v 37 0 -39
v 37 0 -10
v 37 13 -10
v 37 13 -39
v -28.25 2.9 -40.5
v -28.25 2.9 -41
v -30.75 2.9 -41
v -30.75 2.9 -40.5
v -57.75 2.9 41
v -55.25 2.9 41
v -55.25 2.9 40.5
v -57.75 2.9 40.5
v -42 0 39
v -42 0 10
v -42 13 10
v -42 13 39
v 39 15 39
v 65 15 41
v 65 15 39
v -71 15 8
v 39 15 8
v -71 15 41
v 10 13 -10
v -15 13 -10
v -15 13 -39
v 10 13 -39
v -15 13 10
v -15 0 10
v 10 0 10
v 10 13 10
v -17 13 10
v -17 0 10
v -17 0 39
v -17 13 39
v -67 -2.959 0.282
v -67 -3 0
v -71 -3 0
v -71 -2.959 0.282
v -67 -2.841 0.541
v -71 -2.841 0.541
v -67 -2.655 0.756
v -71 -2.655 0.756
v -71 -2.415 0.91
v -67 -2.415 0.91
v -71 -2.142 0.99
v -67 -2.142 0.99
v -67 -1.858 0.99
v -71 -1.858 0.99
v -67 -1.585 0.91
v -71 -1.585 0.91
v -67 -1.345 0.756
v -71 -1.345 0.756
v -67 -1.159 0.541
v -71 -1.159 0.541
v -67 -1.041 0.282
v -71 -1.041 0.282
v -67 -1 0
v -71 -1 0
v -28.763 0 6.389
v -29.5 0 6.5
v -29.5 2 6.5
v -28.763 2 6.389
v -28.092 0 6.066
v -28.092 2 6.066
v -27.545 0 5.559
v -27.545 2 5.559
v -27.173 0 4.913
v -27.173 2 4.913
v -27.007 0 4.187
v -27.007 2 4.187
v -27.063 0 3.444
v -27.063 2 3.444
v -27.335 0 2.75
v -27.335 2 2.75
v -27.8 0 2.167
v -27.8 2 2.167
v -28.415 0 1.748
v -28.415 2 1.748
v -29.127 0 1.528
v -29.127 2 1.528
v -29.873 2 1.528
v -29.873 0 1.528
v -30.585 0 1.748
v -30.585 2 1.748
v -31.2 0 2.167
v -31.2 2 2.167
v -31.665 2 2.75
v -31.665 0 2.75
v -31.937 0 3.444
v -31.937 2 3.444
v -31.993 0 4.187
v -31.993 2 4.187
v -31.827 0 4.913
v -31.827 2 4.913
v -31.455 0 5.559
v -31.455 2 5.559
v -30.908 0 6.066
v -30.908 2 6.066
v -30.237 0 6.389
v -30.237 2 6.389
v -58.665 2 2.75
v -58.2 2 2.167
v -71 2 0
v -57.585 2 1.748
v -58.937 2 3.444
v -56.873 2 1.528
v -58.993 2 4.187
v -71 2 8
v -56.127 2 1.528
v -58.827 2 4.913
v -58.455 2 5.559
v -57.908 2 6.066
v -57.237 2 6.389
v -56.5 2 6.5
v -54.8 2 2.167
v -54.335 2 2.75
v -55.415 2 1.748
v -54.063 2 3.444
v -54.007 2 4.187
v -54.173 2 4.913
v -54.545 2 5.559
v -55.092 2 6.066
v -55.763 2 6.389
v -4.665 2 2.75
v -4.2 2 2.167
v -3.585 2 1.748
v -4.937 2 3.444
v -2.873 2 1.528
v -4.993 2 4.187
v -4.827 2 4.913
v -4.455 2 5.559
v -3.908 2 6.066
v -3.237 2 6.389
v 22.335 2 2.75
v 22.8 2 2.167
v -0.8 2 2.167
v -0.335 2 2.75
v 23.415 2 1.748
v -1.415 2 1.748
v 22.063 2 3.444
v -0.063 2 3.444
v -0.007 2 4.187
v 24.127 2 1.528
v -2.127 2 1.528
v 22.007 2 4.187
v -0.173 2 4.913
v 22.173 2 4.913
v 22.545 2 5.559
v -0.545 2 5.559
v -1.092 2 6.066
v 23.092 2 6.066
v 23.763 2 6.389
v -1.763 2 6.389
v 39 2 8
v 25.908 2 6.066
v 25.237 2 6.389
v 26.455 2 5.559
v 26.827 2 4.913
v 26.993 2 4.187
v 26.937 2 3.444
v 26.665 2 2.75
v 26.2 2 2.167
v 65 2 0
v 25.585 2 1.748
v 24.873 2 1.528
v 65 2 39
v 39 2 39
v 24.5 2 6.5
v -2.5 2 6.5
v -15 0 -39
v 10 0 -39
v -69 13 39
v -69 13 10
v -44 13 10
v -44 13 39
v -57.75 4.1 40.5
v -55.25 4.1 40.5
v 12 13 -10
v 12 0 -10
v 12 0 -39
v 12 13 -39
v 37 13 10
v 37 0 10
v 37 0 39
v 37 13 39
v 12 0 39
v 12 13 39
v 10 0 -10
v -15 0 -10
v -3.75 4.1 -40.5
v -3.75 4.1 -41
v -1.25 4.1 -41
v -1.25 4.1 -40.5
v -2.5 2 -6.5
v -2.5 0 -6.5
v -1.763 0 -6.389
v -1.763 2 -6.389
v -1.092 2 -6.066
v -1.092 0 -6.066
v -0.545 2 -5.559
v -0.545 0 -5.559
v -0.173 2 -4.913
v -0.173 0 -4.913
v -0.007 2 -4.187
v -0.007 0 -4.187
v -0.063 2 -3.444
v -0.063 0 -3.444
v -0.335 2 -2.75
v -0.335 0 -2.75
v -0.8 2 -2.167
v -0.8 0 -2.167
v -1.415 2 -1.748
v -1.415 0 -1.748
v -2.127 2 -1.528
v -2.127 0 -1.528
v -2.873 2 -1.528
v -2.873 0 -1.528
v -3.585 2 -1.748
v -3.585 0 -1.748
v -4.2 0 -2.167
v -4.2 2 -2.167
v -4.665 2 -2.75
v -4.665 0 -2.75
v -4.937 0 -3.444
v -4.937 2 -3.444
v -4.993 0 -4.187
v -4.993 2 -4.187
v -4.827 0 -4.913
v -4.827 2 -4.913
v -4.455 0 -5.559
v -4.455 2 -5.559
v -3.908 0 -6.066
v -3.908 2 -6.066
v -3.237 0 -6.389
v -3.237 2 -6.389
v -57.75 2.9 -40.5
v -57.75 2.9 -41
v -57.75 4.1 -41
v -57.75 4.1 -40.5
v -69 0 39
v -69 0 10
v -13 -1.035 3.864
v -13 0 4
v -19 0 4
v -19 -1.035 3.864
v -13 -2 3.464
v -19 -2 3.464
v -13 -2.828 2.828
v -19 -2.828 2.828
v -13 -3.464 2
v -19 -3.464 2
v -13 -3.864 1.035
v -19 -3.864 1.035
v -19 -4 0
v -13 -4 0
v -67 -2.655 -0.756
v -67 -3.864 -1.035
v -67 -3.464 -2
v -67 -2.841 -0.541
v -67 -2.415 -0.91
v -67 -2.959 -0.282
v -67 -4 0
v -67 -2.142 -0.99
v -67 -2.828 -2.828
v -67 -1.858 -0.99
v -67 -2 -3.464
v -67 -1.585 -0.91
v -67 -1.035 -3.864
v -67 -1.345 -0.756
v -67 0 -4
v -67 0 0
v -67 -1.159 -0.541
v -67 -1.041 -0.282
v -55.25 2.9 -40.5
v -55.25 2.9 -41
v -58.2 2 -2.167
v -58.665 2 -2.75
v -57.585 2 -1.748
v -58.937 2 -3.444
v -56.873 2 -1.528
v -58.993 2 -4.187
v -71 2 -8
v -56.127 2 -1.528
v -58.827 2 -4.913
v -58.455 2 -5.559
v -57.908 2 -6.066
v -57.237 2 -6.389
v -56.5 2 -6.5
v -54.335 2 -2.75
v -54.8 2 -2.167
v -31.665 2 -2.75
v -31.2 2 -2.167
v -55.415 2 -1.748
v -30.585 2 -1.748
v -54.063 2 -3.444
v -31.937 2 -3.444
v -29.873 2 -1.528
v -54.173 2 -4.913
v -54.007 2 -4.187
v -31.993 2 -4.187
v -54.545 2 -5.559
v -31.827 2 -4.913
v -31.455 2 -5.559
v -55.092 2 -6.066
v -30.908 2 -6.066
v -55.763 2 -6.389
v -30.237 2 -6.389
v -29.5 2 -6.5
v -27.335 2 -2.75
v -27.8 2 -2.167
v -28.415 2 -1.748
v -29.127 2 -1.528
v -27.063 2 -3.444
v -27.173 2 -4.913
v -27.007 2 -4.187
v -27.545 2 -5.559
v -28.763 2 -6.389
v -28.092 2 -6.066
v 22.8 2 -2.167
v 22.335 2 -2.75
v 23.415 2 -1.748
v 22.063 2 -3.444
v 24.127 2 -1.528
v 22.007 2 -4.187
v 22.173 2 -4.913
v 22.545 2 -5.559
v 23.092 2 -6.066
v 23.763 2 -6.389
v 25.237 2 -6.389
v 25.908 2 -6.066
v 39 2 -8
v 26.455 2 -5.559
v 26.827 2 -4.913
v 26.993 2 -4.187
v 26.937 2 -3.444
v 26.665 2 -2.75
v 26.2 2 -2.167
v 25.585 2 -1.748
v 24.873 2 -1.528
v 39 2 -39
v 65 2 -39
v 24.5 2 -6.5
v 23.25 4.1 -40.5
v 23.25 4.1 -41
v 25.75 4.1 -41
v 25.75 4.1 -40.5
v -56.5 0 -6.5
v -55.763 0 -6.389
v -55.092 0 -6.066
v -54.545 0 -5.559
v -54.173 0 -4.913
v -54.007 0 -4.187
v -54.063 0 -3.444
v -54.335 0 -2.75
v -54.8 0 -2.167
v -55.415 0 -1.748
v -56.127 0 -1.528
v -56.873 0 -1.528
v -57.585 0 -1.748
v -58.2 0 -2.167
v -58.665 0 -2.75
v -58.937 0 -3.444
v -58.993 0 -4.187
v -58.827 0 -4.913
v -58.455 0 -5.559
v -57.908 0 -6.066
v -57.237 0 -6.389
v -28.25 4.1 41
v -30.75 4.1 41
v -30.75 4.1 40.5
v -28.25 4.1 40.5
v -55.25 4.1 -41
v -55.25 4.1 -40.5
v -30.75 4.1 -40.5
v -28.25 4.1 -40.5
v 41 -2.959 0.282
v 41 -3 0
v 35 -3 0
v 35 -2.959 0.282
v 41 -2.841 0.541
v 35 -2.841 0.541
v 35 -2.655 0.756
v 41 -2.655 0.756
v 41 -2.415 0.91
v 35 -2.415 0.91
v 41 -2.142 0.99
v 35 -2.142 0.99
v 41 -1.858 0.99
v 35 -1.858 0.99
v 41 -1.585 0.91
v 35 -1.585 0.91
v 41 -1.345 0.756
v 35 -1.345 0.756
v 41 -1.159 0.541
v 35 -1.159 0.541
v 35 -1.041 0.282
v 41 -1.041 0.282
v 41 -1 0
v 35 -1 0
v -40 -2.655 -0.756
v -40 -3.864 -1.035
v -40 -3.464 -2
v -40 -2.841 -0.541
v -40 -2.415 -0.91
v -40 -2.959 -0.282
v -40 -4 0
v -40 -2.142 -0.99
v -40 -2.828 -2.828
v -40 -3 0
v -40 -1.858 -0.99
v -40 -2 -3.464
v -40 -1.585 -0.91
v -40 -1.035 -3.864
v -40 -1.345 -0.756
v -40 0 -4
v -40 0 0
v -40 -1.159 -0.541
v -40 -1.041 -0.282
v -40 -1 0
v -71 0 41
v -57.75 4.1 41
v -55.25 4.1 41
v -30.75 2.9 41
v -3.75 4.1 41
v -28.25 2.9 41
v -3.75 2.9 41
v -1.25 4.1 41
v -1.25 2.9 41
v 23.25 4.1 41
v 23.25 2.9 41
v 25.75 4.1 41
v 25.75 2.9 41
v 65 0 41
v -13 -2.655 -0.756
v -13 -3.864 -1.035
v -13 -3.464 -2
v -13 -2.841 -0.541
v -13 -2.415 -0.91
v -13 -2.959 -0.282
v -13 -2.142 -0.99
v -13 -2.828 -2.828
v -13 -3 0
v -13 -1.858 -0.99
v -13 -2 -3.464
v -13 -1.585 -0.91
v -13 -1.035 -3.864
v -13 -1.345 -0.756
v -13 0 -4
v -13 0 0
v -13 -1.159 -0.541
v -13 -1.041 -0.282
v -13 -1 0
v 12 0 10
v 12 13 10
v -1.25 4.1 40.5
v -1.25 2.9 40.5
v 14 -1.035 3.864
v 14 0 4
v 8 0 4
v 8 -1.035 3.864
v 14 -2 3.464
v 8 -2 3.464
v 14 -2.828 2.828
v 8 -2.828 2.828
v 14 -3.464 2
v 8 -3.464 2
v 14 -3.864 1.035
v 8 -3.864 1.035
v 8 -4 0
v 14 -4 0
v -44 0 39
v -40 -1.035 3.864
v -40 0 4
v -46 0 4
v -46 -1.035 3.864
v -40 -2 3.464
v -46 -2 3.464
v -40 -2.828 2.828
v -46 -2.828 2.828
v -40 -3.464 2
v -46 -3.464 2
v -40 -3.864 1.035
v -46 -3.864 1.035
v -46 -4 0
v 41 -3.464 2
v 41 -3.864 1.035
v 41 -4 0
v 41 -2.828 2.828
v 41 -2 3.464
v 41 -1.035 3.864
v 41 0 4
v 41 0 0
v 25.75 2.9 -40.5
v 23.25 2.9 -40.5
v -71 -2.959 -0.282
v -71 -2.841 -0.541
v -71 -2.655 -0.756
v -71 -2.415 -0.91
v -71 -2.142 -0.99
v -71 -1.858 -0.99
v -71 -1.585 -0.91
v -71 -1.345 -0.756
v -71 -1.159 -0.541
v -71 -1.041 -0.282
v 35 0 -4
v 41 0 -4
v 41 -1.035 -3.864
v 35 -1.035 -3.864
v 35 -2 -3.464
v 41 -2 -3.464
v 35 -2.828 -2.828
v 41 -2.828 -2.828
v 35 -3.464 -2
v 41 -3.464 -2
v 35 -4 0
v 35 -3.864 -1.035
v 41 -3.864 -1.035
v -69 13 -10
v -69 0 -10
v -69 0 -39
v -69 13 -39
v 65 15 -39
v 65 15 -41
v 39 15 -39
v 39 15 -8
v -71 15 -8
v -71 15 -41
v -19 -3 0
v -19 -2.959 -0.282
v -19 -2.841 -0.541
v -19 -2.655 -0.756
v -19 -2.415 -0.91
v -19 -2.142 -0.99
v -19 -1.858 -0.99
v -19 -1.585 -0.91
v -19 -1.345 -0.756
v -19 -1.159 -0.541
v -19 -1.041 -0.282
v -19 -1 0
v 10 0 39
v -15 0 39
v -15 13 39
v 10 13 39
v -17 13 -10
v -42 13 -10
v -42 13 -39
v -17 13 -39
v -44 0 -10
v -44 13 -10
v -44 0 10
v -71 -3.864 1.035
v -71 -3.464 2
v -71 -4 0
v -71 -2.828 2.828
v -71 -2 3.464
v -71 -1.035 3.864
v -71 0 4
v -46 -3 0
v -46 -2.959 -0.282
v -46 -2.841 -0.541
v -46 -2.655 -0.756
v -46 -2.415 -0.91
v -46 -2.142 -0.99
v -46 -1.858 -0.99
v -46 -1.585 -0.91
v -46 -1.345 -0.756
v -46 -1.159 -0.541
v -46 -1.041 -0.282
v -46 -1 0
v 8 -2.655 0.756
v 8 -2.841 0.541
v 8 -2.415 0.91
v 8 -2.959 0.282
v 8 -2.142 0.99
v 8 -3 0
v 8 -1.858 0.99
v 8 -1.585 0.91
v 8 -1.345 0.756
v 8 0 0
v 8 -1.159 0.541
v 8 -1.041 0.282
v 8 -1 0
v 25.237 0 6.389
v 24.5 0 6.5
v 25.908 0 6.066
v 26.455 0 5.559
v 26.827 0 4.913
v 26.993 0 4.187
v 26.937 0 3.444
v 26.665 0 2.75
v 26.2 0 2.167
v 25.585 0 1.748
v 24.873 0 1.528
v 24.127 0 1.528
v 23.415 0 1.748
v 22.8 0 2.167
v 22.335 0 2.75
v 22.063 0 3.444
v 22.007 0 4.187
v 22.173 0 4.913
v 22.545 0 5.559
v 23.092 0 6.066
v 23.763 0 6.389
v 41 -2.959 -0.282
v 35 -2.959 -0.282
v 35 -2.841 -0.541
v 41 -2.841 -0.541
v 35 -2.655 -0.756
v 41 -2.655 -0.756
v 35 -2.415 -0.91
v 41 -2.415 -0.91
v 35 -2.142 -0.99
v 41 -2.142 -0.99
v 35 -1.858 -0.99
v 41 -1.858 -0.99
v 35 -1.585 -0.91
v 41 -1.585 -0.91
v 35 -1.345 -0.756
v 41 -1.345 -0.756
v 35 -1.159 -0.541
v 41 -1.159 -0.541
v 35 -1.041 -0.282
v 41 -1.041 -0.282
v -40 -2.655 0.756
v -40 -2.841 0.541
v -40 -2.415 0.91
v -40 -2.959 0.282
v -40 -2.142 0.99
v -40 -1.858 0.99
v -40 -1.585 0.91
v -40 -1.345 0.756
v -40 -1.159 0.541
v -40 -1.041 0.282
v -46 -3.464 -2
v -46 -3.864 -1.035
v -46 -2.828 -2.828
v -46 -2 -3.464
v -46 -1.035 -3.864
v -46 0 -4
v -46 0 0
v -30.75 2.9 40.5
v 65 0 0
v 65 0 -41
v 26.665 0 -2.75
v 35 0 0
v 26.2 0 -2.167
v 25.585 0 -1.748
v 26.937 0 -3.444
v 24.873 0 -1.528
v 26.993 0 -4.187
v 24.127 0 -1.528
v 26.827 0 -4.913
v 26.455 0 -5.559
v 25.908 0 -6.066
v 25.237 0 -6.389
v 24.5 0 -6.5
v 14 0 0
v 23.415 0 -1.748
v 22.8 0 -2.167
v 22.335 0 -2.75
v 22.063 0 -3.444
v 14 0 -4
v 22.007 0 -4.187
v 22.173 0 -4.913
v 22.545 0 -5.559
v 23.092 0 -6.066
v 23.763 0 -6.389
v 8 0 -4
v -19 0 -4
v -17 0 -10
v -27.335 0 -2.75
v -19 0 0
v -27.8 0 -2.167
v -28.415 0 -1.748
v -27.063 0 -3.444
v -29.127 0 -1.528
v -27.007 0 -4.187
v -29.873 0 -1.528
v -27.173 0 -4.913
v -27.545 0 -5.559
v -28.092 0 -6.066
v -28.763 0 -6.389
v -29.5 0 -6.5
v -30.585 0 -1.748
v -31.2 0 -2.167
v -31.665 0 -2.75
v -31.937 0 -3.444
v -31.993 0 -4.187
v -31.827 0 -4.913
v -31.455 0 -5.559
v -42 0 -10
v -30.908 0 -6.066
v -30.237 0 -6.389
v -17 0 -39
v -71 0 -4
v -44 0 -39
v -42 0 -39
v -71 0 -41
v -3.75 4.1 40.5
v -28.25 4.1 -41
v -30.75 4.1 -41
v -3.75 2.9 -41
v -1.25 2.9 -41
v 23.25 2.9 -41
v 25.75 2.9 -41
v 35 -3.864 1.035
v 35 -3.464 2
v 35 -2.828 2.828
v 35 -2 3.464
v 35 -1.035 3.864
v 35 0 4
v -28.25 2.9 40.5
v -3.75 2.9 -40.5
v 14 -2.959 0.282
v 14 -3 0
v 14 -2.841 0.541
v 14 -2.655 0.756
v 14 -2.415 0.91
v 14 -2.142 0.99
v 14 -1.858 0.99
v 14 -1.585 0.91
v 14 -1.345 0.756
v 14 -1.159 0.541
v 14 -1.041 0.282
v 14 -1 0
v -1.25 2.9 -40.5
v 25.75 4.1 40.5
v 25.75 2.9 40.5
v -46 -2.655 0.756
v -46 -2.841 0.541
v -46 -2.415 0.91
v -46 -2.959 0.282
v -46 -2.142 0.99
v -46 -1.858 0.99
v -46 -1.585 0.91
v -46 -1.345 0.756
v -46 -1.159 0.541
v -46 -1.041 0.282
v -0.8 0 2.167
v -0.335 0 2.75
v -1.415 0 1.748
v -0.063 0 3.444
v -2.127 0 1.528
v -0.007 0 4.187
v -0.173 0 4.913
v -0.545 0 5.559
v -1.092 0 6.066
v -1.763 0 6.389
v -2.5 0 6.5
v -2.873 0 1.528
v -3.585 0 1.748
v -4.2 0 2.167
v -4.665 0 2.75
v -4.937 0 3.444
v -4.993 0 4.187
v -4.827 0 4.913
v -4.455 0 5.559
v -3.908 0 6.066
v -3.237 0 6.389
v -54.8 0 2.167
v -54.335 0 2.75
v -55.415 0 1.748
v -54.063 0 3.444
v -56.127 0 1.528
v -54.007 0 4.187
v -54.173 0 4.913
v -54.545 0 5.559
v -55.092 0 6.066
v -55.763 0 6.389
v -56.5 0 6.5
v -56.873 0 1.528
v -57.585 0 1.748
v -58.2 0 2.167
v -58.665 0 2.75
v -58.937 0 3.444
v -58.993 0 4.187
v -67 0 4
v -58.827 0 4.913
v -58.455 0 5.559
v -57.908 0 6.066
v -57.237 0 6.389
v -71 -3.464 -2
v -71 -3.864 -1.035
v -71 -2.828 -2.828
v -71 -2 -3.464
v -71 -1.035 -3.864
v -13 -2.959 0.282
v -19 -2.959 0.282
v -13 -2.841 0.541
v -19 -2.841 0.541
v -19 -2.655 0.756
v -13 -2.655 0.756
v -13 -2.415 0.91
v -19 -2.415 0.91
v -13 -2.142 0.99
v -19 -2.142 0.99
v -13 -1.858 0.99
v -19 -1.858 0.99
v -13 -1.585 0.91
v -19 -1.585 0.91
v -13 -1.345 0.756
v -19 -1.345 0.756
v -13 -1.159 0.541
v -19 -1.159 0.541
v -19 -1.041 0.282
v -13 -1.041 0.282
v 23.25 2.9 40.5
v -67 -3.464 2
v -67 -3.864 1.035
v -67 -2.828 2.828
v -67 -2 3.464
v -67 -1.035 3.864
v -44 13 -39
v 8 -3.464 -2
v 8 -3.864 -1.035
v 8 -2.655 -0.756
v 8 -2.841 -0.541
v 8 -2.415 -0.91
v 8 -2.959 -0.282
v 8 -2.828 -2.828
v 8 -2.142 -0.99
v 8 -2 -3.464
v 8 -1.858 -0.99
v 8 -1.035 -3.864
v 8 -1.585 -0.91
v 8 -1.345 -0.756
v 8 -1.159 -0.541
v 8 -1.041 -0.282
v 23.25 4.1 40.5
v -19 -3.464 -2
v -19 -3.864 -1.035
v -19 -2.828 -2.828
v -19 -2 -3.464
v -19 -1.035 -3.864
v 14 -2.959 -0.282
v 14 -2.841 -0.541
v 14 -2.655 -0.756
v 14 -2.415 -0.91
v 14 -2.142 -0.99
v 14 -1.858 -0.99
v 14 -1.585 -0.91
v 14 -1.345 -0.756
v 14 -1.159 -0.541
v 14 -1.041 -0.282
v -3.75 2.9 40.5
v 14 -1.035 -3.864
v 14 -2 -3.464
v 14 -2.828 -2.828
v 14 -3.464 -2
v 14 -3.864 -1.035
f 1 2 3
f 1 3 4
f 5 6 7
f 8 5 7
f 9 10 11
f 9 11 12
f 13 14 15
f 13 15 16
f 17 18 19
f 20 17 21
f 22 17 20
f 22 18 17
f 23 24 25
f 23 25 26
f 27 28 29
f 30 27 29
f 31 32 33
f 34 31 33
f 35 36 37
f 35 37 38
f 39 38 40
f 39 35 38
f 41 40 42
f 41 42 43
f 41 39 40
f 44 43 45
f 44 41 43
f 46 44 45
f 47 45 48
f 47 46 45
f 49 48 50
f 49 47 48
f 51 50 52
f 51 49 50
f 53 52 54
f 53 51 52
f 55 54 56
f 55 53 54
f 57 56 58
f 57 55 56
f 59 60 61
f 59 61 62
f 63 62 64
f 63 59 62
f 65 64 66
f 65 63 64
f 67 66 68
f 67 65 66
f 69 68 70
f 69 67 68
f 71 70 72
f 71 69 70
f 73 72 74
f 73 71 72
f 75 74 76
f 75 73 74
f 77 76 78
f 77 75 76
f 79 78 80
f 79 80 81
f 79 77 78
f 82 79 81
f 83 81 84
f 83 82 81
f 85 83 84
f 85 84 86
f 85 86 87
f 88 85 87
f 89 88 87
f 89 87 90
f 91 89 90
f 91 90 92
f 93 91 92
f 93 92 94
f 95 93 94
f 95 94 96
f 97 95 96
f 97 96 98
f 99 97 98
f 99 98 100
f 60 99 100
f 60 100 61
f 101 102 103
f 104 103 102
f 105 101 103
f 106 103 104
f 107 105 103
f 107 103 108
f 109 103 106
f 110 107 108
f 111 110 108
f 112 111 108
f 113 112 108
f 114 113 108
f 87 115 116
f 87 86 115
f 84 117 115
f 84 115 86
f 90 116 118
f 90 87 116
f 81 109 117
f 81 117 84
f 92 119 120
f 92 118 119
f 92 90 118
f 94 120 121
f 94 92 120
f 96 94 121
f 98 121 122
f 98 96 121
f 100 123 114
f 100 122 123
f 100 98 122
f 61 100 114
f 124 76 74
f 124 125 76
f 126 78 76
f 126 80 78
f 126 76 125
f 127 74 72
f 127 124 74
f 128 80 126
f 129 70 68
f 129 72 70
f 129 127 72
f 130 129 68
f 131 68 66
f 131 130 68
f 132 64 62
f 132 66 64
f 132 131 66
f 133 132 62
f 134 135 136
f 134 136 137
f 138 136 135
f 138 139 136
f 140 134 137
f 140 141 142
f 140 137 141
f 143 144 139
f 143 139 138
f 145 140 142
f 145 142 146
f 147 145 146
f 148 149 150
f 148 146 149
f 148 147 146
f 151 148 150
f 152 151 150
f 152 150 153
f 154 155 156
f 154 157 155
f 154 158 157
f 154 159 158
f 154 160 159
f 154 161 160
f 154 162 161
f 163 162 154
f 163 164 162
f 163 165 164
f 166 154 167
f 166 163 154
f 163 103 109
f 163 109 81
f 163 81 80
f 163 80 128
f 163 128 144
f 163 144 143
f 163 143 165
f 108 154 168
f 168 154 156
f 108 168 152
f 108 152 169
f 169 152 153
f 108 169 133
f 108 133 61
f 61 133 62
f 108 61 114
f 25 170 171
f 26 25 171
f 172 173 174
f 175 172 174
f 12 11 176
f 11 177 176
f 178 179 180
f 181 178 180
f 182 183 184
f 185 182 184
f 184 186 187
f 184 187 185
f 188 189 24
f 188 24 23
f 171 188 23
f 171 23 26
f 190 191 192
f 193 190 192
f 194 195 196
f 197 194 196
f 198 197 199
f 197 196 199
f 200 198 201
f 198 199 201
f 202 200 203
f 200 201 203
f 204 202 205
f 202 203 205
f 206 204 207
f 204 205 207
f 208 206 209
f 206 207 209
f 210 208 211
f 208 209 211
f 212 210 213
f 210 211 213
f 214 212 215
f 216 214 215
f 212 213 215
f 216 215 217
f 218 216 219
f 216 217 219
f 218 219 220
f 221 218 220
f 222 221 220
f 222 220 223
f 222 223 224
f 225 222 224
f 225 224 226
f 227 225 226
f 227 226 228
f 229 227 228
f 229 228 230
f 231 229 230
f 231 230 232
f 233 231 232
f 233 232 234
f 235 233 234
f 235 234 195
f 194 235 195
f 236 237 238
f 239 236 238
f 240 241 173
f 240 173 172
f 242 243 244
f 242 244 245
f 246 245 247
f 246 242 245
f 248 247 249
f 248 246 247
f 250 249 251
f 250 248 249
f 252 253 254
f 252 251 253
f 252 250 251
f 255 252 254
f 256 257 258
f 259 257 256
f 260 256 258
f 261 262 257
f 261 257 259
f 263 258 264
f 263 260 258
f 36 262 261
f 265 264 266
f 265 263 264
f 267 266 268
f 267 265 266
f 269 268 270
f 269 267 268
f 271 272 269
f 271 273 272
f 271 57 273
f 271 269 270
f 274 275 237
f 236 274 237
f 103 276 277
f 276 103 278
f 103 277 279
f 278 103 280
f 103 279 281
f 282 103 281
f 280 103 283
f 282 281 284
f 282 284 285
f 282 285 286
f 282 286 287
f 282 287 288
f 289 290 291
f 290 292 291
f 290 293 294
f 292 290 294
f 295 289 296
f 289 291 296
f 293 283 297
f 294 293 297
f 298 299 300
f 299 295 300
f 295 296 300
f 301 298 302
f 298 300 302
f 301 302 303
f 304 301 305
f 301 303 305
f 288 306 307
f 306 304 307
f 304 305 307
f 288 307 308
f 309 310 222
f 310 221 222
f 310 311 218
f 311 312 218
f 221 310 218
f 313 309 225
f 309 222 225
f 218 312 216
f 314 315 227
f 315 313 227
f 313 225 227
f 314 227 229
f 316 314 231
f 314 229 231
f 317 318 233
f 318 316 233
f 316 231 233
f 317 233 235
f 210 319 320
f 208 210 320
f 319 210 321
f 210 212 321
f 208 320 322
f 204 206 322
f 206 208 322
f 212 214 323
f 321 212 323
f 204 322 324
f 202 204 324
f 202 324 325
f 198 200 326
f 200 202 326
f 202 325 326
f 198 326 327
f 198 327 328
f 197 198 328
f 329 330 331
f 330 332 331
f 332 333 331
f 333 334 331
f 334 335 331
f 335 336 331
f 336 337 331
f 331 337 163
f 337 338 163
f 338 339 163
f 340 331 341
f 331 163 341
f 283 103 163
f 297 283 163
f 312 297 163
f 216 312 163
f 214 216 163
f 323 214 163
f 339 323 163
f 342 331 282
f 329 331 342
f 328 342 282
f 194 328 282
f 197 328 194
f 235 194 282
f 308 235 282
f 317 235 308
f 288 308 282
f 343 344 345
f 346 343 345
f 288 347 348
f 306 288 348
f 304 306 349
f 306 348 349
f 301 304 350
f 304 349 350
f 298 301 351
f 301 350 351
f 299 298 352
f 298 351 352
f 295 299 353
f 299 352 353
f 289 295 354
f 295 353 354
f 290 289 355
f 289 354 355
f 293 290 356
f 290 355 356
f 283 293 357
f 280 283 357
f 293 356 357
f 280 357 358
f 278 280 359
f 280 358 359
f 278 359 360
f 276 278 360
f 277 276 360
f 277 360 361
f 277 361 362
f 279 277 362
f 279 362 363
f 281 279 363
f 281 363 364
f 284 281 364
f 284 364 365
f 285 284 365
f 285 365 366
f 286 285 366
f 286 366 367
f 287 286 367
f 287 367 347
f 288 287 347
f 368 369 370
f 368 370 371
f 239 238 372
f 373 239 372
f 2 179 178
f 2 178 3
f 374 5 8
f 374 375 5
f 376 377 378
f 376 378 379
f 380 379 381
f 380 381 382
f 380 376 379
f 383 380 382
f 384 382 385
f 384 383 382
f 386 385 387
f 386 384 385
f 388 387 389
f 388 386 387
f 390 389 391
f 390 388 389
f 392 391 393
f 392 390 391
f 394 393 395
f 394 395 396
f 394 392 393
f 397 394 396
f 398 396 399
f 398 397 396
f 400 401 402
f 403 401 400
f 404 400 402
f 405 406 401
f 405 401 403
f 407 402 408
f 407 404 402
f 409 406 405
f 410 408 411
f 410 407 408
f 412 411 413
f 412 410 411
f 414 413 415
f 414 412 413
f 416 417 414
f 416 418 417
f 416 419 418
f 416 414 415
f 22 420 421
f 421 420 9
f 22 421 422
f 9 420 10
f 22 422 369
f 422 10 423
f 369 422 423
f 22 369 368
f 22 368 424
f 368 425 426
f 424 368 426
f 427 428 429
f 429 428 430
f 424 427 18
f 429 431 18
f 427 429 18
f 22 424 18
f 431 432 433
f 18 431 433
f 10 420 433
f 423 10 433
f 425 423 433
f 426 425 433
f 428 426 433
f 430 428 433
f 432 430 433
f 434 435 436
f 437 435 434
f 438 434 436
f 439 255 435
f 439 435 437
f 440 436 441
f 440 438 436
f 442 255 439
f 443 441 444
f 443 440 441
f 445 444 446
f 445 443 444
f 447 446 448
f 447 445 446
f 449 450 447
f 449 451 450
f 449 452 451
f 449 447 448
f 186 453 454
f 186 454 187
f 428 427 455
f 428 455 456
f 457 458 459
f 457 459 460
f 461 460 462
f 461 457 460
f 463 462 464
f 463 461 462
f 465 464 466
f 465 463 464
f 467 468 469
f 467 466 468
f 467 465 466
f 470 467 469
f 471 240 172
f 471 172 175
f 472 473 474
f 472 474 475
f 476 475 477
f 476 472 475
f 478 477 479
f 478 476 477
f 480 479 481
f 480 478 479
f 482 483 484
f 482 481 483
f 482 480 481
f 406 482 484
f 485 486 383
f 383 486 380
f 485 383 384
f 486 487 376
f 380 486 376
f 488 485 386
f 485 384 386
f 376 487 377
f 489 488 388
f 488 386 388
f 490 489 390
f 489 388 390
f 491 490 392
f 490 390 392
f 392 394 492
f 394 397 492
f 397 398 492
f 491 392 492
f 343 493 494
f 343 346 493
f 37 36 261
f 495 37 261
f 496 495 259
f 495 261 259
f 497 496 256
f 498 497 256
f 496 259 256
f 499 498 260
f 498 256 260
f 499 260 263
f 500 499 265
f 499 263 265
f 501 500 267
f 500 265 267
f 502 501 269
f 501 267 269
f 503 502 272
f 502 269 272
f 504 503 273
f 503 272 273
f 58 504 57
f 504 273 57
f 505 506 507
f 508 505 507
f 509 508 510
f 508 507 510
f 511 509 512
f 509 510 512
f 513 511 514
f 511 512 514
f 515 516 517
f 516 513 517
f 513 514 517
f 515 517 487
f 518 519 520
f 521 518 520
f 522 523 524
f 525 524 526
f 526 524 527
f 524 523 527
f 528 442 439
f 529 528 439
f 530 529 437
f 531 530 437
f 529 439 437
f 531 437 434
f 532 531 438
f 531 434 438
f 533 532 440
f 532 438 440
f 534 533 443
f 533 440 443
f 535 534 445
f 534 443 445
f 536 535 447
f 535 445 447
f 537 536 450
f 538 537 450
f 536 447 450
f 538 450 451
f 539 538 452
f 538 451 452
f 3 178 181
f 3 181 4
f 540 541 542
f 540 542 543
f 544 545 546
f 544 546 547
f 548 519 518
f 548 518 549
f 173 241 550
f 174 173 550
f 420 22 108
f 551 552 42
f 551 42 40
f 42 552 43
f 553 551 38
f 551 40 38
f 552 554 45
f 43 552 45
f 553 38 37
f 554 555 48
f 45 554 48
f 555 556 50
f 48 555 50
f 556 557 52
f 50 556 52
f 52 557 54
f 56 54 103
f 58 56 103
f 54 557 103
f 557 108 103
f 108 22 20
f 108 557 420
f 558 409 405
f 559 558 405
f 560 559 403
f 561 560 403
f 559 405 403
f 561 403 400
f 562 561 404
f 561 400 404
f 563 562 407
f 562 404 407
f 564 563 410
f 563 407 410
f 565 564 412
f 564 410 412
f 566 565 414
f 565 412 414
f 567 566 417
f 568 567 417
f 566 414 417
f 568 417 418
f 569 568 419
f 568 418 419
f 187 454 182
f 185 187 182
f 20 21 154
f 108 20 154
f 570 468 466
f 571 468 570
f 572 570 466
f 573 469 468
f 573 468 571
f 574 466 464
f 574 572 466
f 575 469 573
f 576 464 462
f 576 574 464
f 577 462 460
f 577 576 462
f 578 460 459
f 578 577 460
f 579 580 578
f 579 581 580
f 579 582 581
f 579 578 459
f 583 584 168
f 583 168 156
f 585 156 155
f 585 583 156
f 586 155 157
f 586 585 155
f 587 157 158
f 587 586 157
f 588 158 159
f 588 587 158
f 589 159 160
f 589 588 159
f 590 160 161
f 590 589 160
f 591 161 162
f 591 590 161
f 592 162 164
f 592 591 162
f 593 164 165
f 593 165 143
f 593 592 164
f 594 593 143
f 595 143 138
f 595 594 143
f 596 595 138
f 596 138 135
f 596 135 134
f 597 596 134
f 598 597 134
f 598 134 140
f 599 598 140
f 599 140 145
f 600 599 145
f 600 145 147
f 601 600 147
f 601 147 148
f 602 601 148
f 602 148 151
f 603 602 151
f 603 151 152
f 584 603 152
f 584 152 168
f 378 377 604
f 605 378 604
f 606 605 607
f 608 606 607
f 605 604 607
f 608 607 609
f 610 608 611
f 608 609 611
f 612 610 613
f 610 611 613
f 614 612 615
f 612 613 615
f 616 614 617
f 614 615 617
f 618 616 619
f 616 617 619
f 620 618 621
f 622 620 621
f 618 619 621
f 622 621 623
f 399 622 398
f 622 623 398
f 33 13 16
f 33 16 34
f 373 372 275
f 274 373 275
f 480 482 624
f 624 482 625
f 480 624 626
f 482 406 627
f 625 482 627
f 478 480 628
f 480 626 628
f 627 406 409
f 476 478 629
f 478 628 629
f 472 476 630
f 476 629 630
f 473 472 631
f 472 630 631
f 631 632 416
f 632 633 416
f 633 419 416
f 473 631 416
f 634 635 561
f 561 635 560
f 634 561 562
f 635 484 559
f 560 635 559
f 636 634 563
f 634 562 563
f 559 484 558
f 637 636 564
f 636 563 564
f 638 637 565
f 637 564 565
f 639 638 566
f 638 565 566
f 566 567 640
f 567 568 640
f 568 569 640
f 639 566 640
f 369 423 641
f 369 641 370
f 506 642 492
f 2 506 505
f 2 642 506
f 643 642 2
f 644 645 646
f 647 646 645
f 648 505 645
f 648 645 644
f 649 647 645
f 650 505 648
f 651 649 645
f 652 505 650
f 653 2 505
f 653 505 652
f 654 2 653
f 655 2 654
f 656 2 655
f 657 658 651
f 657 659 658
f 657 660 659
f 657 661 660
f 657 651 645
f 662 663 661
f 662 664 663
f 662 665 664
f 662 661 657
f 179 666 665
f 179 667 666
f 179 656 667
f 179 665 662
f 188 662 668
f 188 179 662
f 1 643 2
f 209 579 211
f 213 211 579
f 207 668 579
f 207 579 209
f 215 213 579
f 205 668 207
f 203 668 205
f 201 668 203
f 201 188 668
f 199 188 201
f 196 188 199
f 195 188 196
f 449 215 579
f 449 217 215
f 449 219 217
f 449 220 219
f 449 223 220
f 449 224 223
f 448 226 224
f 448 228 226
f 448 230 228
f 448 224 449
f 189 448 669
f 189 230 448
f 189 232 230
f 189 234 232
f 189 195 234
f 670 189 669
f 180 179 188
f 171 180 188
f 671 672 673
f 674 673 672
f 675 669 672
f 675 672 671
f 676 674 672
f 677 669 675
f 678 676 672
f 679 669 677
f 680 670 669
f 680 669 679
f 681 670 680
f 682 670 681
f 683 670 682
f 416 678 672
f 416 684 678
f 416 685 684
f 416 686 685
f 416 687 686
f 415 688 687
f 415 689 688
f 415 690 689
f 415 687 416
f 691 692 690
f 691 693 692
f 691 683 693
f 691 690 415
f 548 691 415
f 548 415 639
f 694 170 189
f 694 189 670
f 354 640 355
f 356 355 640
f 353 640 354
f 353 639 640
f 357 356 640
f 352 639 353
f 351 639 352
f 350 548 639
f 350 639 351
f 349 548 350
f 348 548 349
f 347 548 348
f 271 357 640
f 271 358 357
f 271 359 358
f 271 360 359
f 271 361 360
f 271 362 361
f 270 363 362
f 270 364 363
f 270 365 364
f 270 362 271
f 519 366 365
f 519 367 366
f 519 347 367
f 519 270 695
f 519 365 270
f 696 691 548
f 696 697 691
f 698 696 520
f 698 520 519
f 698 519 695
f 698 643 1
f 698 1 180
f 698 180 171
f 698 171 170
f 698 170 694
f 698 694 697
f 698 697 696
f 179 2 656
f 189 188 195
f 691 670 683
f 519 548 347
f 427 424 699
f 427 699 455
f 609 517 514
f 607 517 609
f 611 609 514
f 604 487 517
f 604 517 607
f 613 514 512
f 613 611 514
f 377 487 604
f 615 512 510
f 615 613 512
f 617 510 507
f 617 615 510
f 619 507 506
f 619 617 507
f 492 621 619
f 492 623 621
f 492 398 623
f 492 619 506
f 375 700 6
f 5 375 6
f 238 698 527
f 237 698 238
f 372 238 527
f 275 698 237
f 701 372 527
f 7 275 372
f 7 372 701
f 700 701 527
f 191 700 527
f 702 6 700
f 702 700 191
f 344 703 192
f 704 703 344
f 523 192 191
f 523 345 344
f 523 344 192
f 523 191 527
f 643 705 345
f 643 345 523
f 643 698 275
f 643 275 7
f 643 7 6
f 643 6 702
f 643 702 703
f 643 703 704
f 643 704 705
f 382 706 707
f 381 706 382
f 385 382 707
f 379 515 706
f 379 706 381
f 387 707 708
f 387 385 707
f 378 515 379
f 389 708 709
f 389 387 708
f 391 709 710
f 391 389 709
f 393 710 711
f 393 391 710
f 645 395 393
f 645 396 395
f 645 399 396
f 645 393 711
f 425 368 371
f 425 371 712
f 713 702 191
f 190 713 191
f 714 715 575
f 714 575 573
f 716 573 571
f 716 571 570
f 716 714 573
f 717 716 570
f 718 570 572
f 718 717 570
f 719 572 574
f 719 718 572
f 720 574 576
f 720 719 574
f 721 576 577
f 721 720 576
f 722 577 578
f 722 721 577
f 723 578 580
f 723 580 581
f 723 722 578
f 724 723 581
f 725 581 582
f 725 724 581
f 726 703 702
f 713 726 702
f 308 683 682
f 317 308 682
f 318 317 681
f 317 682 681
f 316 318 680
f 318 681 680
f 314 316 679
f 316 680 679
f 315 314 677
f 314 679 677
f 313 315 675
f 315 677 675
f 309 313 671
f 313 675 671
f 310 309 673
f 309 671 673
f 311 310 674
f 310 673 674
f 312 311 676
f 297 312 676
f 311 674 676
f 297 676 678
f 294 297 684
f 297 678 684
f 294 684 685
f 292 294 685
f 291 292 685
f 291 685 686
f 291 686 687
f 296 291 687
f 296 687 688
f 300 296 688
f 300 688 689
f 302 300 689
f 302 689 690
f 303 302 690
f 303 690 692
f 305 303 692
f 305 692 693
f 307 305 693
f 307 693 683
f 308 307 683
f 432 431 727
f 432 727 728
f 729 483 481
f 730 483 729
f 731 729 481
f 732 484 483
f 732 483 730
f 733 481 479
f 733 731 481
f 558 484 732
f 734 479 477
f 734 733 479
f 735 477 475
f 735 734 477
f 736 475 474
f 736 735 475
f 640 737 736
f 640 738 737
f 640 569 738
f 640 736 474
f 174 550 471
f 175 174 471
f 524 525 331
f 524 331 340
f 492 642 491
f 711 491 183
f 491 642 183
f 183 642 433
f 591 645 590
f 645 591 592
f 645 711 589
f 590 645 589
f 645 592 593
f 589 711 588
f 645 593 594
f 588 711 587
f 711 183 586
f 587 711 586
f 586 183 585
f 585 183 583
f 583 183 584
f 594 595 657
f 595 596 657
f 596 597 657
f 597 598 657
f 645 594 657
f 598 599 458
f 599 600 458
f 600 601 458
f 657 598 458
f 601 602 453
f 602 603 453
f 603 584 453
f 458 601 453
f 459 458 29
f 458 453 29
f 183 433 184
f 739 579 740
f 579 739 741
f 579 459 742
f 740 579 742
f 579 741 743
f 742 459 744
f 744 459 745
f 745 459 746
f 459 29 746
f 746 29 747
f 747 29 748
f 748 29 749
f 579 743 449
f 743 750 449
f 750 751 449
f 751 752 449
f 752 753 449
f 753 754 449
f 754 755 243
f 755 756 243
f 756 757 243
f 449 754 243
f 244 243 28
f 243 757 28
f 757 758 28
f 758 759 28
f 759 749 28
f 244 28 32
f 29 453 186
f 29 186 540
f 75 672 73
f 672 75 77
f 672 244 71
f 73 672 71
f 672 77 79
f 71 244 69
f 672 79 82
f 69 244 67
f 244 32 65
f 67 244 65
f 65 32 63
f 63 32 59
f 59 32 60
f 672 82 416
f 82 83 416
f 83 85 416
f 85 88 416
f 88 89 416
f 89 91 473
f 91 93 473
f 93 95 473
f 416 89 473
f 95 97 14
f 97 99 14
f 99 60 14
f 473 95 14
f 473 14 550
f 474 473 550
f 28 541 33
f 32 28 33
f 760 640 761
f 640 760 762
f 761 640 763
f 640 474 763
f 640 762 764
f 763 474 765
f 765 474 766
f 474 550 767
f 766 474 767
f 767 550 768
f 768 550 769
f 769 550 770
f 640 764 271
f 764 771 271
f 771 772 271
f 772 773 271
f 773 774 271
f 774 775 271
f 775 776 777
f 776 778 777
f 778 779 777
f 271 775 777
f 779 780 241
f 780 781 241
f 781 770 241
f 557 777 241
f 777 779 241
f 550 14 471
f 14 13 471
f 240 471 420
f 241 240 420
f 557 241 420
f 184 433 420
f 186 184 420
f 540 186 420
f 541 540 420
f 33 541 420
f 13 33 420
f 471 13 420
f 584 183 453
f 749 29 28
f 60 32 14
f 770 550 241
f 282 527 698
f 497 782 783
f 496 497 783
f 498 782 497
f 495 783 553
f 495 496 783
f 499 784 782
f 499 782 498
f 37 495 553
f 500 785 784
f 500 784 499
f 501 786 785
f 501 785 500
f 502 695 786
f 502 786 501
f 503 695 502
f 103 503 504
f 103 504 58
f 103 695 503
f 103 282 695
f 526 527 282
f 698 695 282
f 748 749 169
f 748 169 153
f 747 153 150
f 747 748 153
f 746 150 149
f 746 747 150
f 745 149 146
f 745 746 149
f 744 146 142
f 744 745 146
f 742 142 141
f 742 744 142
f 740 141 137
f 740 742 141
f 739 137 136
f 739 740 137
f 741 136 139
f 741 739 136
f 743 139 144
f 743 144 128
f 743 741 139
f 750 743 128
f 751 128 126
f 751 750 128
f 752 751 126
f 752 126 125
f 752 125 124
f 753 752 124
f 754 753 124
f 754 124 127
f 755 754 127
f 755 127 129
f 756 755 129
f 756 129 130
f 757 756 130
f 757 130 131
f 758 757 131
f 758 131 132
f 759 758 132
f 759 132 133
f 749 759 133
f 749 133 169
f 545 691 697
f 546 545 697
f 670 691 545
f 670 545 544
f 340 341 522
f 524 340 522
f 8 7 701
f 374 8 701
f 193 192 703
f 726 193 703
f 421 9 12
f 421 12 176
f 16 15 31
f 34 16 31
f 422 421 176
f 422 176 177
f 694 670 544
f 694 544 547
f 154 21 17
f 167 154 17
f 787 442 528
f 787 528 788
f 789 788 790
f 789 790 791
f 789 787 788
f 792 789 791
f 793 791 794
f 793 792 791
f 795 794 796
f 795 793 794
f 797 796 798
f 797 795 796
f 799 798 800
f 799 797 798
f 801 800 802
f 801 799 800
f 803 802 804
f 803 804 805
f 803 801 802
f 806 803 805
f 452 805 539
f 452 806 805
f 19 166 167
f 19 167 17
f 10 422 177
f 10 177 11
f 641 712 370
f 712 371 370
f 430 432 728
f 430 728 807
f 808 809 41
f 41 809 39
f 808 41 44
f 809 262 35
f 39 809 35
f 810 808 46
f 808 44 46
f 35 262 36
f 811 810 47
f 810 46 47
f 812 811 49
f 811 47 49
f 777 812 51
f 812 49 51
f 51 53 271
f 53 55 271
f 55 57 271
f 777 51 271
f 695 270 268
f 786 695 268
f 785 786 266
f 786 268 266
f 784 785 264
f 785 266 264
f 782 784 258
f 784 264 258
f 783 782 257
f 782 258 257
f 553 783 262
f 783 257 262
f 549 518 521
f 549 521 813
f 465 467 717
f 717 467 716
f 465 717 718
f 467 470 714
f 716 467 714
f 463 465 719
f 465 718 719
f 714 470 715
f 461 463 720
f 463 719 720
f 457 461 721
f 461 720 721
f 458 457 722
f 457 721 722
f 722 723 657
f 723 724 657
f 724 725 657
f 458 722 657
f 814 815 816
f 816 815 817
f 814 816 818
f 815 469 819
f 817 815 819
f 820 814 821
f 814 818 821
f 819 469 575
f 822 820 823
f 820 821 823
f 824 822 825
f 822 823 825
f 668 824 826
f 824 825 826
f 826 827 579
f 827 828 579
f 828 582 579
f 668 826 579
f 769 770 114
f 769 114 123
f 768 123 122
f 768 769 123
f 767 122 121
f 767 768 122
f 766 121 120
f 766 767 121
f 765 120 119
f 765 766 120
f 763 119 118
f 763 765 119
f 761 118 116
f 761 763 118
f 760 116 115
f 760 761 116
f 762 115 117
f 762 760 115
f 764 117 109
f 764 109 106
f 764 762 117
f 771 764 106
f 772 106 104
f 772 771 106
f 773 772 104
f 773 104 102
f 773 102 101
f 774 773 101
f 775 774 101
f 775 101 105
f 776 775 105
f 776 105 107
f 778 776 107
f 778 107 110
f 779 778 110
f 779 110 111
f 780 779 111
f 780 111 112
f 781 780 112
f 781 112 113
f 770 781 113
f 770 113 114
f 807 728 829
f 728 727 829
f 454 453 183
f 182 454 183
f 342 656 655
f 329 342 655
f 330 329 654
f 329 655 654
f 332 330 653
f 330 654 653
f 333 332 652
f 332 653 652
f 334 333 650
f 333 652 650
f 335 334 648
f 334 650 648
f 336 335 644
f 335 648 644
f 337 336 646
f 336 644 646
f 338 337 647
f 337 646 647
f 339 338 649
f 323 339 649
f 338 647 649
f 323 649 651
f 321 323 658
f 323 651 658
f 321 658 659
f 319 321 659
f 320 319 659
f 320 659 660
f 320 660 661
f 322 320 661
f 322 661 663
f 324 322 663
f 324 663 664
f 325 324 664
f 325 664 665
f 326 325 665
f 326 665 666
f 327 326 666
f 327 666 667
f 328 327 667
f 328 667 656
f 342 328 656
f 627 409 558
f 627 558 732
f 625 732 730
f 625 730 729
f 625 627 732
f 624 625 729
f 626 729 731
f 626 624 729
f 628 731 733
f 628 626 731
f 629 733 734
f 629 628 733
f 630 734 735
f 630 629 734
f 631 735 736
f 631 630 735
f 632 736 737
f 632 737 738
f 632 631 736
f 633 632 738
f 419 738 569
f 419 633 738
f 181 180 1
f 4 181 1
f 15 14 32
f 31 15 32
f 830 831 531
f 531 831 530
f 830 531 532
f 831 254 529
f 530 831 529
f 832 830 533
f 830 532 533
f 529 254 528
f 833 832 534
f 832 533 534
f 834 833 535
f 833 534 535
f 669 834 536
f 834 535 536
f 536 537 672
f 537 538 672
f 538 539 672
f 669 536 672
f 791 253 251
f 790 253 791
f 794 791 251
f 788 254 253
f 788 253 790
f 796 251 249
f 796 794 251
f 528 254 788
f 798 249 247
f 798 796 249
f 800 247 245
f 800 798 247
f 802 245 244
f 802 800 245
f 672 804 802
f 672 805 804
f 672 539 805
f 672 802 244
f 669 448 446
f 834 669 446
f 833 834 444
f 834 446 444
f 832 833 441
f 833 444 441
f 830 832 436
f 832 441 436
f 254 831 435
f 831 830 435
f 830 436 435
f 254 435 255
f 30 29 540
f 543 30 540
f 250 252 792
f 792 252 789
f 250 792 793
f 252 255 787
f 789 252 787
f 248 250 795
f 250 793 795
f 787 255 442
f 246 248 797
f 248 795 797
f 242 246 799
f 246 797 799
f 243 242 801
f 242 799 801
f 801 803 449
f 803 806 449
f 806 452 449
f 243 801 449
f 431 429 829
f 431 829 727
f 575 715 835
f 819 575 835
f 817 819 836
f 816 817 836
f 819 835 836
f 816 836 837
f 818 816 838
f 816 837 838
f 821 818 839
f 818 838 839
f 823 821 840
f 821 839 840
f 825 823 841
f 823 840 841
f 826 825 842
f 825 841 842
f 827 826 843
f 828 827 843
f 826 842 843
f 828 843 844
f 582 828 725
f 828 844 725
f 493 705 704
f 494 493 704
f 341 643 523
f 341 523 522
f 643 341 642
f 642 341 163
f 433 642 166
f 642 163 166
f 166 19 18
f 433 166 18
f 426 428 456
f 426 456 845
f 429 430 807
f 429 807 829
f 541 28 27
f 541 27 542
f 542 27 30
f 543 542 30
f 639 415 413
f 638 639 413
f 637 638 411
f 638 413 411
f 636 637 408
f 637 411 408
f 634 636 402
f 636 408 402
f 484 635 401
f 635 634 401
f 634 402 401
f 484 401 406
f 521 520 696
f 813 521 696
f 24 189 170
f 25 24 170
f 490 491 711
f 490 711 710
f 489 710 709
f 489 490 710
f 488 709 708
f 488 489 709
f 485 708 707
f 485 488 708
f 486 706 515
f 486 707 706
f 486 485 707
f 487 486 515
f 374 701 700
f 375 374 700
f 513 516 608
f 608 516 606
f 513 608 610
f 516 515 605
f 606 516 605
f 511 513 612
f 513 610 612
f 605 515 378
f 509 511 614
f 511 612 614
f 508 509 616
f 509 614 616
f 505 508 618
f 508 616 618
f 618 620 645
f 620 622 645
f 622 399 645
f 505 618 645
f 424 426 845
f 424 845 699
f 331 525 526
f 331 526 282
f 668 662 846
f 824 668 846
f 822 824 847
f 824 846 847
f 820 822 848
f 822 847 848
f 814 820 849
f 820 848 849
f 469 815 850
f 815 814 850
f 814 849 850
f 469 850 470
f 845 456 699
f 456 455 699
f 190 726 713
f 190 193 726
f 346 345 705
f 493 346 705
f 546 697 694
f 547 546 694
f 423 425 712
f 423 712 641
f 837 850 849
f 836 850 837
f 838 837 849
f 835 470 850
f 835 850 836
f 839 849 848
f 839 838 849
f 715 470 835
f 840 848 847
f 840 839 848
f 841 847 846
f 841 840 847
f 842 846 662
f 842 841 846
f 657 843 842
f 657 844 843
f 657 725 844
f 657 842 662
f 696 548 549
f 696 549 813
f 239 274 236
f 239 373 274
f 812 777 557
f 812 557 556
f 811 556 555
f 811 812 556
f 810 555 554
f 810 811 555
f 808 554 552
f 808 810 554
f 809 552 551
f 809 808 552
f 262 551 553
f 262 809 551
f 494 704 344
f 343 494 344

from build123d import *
from build123d.topology import SkipClean

# Parameters (mm, degrees)
EXTRUDE_1_DEPTH        = 15
SKETCH_4_W             = 25
SKETCH_4_H             = 29
CUT_EXTRUDE_2_DEPTH    = 13
PATTERN_LINEAR_1_COUNT = 4
PATTERN_LINEAR_1_PITCH = 27
CUT_EXTRUDE_3_DEPTH    = 149.559752288
EXTRUDE_2_DEPTH        = 142
CUT_EXTRUDE_4_DEPTH    = 149.559752288
SKETCH_14_W            = 21
SKETCH_14_H            = 4
CUT_EXTRUDE_7_DEPTH    = 84.348665256
PATTERN_LINEAR_3_COUNT = 5
PATTERN_LINEAR_3_PITCH = 27
CUT_EXTRUDE_8_DEPTH    = 84.348665256
SKETCH_17_R            = 2.5
CUT_EXTRUDE_9_DEPTH    = 84.348665256
PATTERN_LINEAR_4_COUNT = 4
PATTERN_LINEAR_4_PITCH = 27
SKETCH_21_W            = 31
SKETCH_21_H            = 13
CUT_EXTRUDE_11_DEPTH   = 32
CUT_EXTRUDE_12_DEPTH   = 0.5
PATTERN_LINEAR_5_COUNT = 4
PATTERN_LINEAR_5_PITCH = 27
CUT_EXTRUDE_13_DEPTH   = 6


# Read off the part's stored shape, not the designer's step: 镜向1
with BuildPart() as part:
    # 草图3 → 凸台-拉伸1 (new body)
    with BuildSketch(Plane(origin=(0, 0, 0), x_dir=(1, 0, 0), z_dir=(0, 1, 0))):
        Polygon((0, 0), (-71, 0), (-71, 41), (71, 41), (71, 0), align=None)
    extrude(amount=EXTRUDE_1_DEPTH)

    # 草图4 → 切除-拉伸2 (cut)
    with BuildSketch(Plane(origin=(0, 0, 0), x_dir=(1, 0, 0), z_dir=(0, 1, 0))):
        with Locations((-56.5, 24.5)):
            Rectangle(SKETCH_4_W, SKETCH_4_H)
    cut_extrude_2 = extrude(amount=CUT_EXTRUDE_2_DEPTH, mode=Mode.SUBTRACT)

    # 阵列(线性)1: 切除-拉伸2 ×4
    with Locations(*[(i * PATTERN_LINEAR_1_PITCH, 0, 0) for i in range(1, PATTERN_LINEAR_1_COUNT)]):
        add(cut_extrude_2, mode=Mode.SUBTRACT)

    # 草图6 → 切除-拉伸3 (cut, through all)
    with BuildSketch(Plane(origin=(71, 0, 0), x_dir=(0, 0, -1), z_dir=(1, 0, 0))):
        Polygon((0, 15), (7.5, 15), (8, 15), (8, 2), (7.5, 2), (0, 2), align=None)
    extrude(amount=-CUT_EXTRUDE_3_DEPTH, mode=Mode.SUBTRACT)

    # 草图7 → 凸台-拉伸2 (add)
    with BuildSketch(Plane(origin=(71, 0, 0), x_dir=(0, 0, -1), z_dir=(1, 0, 0))):
        with BuildLine():
            Line((0, 0), (4, 0))
            ThreePointArc((4, 0), (2.828427125, -2.828427125), (0, -4))
            Line((0, -4), (0, 0))
        make_face()
    extrude(amount=-EXTRUDE_2_DEPTH)

    # 草图8 → 切除-拉伸4 (cut, through all)
    with BuildSketch(Plane(origin=(71, 0, 0), x_dir=(0, 0, -1), z_dir=(1, 0, 0))):
        with BuildLine():
            Line((0, -1), (0, -2))
            Line((0, -2), (0, -3))
            ThreePointArc((0, -3), (1, -2), (0, -1))
        make_face()
    extrude(amount=-CUT_EXTRUDE_4_DEPTH, mode=Mode.SUBTRACT)

    # 草图14 → 切除-拉伸7 (cut, through all)
    with BuildSketch(Plane.XY):
        with Locations((-56.5, -2)):
            Rectangle(SKETCH_14_W, SKETCH_14_H)
    cut_extrude_7 = extrude(amount=-CUT_EXTRUDE_7_DEPTH, mode=Mode.SUBTRACT)

    # 阵列(线性)3: 切除-拉伸7 ×5
    with Locations(*[(i * PATTERN_LINEAR_3_PITCH, 0, 0) for i in range(1, PATTERN_LINEAR_3_COUNT)]):
        add(cut_extrude_7, mode=Mode.SUBTRACT)

    # 草图16 → 切除-拉伸8 (cut, through all)
    with BuildSketch(Plane.XY):
        Polygon((71, -1), (71, 0), (42.178247133, 0), (42.178247133, -4), (71, -4), align=None)
    extrude(amount=-CUT_EXTRUDE_8_DEPTH, mode=Mode.SUBTRACT)

    # 草图17 → 切除-拉伸9 (cut, through all)
    with BuildSketch(Plane.XZ):
        with Locations(Location((-56.5, -4, 0), (0, 0, 270))):
            Circle(SKETCH_17_R)
    cut_extrude_9 = extrude(amount=-CUT_EXTRUDE_9_DEPTH, mode=Mode.SUBTRACT)

    # 阵列(线性)4: 切除-拉伸9 ×4
    with Locations(*[(i * PATTERN_LINEAR_4_PITCH, 0, 0) for i in range(1, PATTERN_LINEAR_4_COUNT)]):
        add(cut_extrude_9, mode=Mode.SUBTRACT)

    # 草图21 → 切除-拉伸11 (cut)
    with BuildSketch(Plane(origin=(71, 0, 0), x_dir=(0, 0, -1), z_dir=(1, 0, 0))):
        with Locations((23.5, 8.5)):
            Rectangle(SKETCH_21_W, SKETCH_21_H)
    extrude(amount=-CUT_EXTRUDE_11_DEPTH, mode=Mode.SUBTRACT)

    # 草图23 → 切除-拉伸12 (cut)
    with BuildSketch(Plane(origin=(0, 0, -41), x_dir=(-1, 0, 0), z_dir=(0, 0, -1))):
        Polygon((55.25, 2.9), (56.5, 2.9), (57.75, 2.9), (57.75, 3.5), (57.75, 4.1), (55.25, 4.1), (55.25, 3.5), align=None)
    cut_extrude_12 = extrude(amount=-CUT_EXTRUDE_12_DEPTH, mode=Mode.SUBTRACT)

    # 阵列(线性)5: 切除-拉伸12 ×4
    with Locations(*[(i * PATTERN_LINEAR_5_PITCH, 0, 0) for i in range(1, PATTERN_LINEAR_5_COUNT)]):
        add(cut_extrude_12, mode=Mode.SUBTRACT)

    # 镜向1: part across plane


with BuildPart() as part_1:
    with SkipClean():  # the faces are left unmerged after this step: merging them gives an invalid solid
        add(part.part)
        add(part.part.mirror(Plane.XY))

    # 草图25 → 切除-拉伸13 (cut)
    with SkipClean():  # the faces are left unmerged after this step: merging them gives an invalid solid
        with BuildSketch(Plane(origin=(71, 0, 0), x_dir=(0, 0, -1), z_dir=(1, 0, 0))):
            Polygon((41, 15), (41, 0), (-41, 0), (-41, 15), (-39, 15), (-39, 2), (39, 2), (39, 15), align=None)
        extrude(amount=-CUT_EXTRUDE_13_DEPTH, mode=Mode.SUBTRACT)


solid = part_1.part
